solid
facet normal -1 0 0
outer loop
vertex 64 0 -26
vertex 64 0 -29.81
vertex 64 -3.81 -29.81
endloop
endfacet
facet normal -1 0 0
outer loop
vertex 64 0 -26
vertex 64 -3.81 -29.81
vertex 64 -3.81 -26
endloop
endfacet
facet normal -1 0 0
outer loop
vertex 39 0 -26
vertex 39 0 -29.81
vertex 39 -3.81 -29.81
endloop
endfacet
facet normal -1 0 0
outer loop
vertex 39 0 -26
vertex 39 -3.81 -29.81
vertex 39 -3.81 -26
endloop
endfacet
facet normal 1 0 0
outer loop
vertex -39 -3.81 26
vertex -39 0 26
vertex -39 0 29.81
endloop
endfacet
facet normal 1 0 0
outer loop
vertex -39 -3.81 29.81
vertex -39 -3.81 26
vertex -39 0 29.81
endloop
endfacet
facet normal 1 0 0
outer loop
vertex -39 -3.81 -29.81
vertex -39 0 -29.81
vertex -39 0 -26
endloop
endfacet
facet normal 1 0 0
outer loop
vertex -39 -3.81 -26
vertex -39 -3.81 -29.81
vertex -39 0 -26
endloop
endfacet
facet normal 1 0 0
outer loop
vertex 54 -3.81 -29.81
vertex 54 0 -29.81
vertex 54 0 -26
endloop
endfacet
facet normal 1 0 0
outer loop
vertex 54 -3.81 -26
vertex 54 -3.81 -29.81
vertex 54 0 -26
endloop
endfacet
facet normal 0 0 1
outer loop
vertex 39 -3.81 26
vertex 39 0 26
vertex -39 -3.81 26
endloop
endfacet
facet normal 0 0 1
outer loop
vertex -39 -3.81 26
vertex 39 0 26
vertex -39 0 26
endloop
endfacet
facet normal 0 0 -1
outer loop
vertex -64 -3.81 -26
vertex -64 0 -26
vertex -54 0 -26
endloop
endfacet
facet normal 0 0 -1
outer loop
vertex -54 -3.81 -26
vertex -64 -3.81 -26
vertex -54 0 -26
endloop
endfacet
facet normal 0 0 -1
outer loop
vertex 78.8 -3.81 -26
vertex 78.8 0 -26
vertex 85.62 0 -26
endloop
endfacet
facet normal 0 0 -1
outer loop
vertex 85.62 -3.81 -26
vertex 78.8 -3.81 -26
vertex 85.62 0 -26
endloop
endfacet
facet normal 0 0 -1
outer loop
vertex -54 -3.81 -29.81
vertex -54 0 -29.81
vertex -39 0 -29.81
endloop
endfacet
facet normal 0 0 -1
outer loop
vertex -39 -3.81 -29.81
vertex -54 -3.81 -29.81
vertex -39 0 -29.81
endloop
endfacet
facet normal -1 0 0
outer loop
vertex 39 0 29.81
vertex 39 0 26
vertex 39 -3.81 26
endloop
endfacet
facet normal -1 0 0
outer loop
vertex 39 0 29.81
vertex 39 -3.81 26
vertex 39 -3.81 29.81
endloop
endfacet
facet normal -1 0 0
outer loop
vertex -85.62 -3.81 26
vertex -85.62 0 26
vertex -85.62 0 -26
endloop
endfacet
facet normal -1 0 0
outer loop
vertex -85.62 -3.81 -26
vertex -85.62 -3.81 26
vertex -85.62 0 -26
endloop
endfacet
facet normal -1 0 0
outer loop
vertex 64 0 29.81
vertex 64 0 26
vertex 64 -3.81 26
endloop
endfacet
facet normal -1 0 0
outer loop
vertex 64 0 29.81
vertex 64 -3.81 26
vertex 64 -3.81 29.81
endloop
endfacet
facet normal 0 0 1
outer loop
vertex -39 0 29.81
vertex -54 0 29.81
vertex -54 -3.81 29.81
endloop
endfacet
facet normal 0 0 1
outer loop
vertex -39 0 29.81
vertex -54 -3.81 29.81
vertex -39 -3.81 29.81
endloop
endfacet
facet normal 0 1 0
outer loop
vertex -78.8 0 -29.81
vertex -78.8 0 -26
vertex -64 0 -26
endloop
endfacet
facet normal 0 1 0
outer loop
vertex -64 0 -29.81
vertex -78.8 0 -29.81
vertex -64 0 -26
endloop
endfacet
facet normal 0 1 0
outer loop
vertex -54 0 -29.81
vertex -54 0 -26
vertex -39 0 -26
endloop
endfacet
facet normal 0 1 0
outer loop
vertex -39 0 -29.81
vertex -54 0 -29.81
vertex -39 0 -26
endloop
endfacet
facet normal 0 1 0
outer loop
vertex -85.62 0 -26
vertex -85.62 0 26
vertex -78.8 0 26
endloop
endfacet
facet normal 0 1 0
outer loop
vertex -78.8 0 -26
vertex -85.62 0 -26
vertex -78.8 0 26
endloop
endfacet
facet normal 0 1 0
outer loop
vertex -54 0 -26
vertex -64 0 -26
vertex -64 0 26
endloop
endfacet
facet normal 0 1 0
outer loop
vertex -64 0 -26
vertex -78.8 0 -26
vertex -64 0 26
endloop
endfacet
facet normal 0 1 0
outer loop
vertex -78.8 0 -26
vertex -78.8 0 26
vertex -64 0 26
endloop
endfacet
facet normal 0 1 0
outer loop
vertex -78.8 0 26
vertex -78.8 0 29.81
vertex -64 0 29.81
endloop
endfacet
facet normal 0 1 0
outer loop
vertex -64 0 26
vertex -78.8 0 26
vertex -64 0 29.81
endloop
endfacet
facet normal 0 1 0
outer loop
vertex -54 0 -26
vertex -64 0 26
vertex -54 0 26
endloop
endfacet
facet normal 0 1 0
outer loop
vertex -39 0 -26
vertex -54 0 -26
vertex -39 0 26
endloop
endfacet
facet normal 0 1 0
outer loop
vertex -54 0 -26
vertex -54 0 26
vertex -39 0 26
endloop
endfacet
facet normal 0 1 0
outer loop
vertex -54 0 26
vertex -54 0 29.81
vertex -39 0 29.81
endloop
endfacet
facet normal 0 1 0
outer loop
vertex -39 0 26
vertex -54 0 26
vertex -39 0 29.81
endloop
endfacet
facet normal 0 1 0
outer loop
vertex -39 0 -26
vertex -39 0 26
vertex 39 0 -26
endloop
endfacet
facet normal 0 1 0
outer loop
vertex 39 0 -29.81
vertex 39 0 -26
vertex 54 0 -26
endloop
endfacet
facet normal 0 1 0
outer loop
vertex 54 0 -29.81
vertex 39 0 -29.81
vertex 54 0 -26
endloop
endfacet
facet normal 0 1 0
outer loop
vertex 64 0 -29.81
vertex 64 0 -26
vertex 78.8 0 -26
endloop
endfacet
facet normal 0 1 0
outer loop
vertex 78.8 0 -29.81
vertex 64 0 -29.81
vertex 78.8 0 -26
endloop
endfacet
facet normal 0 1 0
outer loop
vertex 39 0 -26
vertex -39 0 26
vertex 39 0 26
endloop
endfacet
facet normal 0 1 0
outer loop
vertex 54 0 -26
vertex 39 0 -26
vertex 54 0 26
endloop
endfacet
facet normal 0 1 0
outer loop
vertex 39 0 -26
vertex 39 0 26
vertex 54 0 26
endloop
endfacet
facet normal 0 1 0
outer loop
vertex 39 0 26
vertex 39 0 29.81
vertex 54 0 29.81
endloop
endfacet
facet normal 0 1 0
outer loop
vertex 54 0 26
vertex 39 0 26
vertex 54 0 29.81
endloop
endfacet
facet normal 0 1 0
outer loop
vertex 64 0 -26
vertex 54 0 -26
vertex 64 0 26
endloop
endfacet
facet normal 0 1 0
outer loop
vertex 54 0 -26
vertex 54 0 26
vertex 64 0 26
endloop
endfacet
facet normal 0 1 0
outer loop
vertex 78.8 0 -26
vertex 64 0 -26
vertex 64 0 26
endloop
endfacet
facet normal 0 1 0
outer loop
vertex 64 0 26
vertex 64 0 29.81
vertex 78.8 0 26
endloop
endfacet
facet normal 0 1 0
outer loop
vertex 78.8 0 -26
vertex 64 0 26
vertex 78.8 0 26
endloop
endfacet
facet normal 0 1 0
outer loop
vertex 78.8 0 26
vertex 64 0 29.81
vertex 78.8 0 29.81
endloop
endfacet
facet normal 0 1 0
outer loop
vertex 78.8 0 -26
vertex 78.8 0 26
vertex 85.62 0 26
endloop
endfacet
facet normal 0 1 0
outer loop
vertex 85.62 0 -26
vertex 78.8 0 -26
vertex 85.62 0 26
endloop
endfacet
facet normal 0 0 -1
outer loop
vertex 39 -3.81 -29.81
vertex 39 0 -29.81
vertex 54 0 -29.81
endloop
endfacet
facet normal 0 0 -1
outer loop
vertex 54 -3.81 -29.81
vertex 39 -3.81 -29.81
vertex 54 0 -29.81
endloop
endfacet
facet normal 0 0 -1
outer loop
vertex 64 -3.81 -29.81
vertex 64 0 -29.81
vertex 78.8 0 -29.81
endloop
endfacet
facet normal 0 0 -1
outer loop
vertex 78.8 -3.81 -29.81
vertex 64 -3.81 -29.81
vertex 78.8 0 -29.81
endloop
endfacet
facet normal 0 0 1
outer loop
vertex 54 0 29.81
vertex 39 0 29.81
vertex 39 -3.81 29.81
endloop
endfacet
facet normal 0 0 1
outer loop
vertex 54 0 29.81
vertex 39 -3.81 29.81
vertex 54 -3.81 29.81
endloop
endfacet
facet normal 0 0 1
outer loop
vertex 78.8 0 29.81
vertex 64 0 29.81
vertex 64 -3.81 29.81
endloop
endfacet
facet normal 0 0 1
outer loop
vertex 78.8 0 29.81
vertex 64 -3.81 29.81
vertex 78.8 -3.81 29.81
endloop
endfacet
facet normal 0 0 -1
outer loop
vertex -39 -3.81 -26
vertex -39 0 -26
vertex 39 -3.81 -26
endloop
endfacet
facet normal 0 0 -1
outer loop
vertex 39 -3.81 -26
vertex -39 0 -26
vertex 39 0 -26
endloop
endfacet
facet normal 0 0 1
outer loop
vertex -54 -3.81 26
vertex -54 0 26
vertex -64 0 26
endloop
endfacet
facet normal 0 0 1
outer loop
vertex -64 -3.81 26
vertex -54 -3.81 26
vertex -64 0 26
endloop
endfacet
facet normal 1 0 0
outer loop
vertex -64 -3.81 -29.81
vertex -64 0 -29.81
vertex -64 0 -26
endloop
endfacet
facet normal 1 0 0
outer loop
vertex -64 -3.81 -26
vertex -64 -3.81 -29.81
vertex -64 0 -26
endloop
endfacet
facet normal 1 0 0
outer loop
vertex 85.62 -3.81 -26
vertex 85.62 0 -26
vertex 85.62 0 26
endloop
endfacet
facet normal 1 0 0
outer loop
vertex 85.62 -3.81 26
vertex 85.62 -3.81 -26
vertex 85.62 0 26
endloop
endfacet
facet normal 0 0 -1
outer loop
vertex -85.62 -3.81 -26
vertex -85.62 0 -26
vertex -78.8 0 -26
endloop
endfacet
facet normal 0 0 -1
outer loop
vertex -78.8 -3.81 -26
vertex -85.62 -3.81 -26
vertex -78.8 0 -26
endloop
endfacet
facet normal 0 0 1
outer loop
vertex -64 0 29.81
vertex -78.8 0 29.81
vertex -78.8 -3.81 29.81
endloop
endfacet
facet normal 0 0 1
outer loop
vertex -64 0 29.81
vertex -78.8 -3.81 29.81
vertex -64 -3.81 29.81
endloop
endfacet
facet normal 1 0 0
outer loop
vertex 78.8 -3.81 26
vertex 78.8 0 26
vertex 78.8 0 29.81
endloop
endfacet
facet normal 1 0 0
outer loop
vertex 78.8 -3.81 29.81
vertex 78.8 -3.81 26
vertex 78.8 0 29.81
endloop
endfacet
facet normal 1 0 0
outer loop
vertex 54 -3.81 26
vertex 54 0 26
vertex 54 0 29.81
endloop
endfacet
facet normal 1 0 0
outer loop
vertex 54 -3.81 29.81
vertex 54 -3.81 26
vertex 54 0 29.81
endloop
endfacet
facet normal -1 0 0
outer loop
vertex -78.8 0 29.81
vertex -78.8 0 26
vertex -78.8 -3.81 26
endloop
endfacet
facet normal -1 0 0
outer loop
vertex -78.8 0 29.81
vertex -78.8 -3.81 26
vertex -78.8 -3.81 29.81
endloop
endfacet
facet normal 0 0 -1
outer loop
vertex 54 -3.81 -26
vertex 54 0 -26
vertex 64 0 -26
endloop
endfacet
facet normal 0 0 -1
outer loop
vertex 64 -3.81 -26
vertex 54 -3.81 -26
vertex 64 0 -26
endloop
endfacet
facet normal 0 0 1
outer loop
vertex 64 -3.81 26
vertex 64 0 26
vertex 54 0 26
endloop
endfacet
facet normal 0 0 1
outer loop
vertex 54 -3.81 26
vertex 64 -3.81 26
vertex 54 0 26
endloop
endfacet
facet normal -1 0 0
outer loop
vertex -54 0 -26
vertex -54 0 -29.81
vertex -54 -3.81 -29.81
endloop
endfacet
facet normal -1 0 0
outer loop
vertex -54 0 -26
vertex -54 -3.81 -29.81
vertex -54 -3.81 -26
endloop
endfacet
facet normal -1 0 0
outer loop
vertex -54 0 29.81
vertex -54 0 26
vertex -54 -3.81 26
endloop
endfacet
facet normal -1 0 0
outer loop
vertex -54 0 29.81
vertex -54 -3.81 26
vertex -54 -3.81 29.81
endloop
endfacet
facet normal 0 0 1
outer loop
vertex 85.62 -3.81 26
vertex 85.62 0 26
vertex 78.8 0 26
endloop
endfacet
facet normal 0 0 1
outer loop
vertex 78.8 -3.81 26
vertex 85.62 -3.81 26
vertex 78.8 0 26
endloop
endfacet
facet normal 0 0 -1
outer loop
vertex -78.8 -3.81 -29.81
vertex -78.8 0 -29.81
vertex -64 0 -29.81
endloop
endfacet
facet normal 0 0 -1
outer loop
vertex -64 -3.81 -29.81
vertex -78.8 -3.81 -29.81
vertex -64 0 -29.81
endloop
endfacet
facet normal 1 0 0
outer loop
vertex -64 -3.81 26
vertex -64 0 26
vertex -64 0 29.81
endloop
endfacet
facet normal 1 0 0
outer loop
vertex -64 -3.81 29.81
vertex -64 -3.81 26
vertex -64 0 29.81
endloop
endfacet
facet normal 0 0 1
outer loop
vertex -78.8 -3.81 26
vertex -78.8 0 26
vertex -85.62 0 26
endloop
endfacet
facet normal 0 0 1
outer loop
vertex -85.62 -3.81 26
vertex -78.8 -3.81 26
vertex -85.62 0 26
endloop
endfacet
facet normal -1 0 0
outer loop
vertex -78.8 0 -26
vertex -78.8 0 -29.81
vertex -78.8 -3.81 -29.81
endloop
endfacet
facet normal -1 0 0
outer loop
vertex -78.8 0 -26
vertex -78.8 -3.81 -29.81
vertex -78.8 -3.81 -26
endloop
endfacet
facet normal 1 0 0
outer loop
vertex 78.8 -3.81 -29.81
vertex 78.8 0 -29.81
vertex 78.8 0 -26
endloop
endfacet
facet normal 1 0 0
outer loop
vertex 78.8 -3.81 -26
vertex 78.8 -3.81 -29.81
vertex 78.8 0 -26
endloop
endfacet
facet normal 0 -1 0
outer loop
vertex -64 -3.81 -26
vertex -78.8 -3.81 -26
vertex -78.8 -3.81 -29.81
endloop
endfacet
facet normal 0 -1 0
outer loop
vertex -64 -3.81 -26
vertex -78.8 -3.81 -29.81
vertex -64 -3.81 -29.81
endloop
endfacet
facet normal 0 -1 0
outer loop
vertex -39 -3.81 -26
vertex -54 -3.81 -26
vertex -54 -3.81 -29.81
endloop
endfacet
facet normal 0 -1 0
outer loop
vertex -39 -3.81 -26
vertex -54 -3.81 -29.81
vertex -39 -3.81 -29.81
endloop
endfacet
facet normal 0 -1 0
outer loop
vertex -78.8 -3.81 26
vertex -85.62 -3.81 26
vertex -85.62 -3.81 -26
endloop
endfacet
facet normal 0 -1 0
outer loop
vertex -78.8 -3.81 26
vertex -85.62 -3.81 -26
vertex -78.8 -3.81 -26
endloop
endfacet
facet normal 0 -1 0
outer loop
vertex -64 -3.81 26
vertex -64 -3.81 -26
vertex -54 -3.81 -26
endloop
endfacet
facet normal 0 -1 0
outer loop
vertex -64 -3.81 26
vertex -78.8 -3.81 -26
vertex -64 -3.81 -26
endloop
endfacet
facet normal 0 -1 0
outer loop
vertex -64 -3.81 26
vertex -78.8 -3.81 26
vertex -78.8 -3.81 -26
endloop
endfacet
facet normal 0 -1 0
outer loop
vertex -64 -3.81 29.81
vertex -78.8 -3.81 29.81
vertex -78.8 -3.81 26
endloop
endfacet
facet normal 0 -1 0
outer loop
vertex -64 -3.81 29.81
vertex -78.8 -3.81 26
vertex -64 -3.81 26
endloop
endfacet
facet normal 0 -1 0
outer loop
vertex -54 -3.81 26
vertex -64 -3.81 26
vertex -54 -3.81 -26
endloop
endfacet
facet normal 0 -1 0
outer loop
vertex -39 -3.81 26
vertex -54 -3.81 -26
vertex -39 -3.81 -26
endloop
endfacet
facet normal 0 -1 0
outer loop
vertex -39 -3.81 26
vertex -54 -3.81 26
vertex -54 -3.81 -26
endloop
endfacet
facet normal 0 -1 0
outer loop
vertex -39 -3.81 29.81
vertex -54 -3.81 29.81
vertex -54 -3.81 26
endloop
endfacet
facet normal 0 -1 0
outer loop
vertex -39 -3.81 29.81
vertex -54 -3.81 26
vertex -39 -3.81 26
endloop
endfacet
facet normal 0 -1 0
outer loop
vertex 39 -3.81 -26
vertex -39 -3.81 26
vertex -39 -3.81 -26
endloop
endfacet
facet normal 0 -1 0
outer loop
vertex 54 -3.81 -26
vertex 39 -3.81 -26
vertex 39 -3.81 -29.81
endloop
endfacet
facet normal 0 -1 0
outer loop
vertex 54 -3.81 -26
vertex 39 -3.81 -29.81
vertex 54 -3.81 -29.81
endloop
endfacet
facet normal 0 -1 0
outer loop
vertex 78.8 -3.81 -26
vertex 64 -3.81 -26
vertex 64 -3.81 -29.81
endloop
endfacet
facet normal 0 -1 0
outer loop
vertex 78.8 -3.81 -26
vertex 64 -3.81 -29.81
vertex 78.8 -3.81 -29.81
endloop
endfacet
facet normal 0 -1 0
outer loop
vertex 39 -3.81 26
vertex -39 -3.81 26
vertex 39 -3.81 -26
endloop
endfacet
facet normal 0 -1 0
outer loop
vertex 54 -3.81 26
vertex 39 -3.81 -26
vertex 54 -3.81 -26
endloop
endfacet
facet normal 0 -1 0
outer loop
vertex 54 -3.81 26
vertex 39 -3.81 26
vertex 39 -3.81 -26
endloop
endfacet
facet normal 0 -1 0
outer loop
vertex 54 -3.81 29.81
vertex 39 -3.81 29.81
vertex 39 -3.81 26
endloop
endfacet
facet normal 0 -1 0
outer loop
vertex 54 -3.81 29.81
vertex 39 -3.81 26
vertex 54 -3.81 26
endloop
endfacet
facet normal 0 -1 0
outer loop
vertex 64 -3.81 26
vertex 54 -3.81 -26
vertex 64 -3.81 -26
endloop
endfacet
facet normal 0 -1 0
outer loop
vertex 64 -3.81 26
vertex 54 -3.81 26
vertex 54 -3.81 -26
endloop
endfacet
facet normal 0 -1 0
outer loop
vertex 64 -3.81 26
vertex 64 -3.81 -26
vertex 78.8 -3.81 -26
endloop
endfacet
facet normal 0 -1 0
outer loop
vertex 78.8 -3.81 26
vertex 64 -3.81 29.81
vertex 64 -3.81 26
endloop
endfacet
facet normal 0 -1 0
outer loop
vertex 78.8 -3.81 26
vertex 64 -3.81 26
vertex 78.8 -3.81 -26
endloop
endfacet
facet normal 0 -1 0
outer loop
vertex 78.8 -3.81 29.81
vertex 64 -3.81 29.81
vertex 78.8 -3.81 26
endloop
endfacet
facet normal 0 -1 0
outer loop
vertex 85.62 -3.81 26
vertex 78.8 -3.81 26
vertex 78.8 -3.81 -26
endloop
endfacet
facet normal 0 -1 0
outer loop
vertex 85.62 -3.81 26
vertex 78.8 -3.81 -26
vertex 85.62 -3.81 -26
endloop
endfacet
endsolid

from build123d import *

# Parameters (mm, degrees)
F0_W     = 14.8
F0_H     = 3.81
F0_W_2   = 15
F1_DEPTH = 3.81


# Not quite as in the source:
# - a feature names something its author has since deleted; it is built from what else it names


with BuildPart() as f1:
    # F0 (on Front) → F1 (new body)
    with BuildSketch(Plane.XZ):
        Polygon((85.62, 0), (85.62, 26), (78.8, 26), (64, 26), (54, 26), (39, 26), (0, 26), (0, 0), align=None)
        Polygon((-85.62, 0), (0, 0), (0, 26), (-39, 26), (-54, 26), (-64, 26), (-78.8, 26), (-85.62, 26), align=None)
        Polygon((0, -26), (0, 0), (-85.62, 0), (-85.62, -26), (-78.8, -26), (-64, -26), (-54, -26), (-39, -26), align=None)
        Polygon((85.62, -26), (85.62, 0), (0, 0), (0, -26), (39, -26), (54, -26), (64, -26), (78.8, -26), align=None)
        with Locations((71.4, 27.905)):
            Rectangle(F0_W, F0_H)
        with Locations((-71.4, -27.905)):
            Rectangle(F0_W, F0_H)
        with Locations((-71.4, 27.905)):
            Rectangle(F0_W, F0_H)
        with Locations((71.4, -27.905)):
            Rectangle(F0_W, F0_H)
        with Locations((-46.5, 27.905)):
            Rectangle(F0_W_2, F0_H)
        with Locations((-46.5, -27.905)):
            Rectangle(F0_W_2, F0_H)
        with Locations((46.5, -27.905)):
            Rectangle(F0_W_2, F0_H)
        with Locations((46.5, 27.905)):
            Rectangle(F0_W_2, F0_H)
    extrude(amount=F1_DEPTH)


solid = f1.part
